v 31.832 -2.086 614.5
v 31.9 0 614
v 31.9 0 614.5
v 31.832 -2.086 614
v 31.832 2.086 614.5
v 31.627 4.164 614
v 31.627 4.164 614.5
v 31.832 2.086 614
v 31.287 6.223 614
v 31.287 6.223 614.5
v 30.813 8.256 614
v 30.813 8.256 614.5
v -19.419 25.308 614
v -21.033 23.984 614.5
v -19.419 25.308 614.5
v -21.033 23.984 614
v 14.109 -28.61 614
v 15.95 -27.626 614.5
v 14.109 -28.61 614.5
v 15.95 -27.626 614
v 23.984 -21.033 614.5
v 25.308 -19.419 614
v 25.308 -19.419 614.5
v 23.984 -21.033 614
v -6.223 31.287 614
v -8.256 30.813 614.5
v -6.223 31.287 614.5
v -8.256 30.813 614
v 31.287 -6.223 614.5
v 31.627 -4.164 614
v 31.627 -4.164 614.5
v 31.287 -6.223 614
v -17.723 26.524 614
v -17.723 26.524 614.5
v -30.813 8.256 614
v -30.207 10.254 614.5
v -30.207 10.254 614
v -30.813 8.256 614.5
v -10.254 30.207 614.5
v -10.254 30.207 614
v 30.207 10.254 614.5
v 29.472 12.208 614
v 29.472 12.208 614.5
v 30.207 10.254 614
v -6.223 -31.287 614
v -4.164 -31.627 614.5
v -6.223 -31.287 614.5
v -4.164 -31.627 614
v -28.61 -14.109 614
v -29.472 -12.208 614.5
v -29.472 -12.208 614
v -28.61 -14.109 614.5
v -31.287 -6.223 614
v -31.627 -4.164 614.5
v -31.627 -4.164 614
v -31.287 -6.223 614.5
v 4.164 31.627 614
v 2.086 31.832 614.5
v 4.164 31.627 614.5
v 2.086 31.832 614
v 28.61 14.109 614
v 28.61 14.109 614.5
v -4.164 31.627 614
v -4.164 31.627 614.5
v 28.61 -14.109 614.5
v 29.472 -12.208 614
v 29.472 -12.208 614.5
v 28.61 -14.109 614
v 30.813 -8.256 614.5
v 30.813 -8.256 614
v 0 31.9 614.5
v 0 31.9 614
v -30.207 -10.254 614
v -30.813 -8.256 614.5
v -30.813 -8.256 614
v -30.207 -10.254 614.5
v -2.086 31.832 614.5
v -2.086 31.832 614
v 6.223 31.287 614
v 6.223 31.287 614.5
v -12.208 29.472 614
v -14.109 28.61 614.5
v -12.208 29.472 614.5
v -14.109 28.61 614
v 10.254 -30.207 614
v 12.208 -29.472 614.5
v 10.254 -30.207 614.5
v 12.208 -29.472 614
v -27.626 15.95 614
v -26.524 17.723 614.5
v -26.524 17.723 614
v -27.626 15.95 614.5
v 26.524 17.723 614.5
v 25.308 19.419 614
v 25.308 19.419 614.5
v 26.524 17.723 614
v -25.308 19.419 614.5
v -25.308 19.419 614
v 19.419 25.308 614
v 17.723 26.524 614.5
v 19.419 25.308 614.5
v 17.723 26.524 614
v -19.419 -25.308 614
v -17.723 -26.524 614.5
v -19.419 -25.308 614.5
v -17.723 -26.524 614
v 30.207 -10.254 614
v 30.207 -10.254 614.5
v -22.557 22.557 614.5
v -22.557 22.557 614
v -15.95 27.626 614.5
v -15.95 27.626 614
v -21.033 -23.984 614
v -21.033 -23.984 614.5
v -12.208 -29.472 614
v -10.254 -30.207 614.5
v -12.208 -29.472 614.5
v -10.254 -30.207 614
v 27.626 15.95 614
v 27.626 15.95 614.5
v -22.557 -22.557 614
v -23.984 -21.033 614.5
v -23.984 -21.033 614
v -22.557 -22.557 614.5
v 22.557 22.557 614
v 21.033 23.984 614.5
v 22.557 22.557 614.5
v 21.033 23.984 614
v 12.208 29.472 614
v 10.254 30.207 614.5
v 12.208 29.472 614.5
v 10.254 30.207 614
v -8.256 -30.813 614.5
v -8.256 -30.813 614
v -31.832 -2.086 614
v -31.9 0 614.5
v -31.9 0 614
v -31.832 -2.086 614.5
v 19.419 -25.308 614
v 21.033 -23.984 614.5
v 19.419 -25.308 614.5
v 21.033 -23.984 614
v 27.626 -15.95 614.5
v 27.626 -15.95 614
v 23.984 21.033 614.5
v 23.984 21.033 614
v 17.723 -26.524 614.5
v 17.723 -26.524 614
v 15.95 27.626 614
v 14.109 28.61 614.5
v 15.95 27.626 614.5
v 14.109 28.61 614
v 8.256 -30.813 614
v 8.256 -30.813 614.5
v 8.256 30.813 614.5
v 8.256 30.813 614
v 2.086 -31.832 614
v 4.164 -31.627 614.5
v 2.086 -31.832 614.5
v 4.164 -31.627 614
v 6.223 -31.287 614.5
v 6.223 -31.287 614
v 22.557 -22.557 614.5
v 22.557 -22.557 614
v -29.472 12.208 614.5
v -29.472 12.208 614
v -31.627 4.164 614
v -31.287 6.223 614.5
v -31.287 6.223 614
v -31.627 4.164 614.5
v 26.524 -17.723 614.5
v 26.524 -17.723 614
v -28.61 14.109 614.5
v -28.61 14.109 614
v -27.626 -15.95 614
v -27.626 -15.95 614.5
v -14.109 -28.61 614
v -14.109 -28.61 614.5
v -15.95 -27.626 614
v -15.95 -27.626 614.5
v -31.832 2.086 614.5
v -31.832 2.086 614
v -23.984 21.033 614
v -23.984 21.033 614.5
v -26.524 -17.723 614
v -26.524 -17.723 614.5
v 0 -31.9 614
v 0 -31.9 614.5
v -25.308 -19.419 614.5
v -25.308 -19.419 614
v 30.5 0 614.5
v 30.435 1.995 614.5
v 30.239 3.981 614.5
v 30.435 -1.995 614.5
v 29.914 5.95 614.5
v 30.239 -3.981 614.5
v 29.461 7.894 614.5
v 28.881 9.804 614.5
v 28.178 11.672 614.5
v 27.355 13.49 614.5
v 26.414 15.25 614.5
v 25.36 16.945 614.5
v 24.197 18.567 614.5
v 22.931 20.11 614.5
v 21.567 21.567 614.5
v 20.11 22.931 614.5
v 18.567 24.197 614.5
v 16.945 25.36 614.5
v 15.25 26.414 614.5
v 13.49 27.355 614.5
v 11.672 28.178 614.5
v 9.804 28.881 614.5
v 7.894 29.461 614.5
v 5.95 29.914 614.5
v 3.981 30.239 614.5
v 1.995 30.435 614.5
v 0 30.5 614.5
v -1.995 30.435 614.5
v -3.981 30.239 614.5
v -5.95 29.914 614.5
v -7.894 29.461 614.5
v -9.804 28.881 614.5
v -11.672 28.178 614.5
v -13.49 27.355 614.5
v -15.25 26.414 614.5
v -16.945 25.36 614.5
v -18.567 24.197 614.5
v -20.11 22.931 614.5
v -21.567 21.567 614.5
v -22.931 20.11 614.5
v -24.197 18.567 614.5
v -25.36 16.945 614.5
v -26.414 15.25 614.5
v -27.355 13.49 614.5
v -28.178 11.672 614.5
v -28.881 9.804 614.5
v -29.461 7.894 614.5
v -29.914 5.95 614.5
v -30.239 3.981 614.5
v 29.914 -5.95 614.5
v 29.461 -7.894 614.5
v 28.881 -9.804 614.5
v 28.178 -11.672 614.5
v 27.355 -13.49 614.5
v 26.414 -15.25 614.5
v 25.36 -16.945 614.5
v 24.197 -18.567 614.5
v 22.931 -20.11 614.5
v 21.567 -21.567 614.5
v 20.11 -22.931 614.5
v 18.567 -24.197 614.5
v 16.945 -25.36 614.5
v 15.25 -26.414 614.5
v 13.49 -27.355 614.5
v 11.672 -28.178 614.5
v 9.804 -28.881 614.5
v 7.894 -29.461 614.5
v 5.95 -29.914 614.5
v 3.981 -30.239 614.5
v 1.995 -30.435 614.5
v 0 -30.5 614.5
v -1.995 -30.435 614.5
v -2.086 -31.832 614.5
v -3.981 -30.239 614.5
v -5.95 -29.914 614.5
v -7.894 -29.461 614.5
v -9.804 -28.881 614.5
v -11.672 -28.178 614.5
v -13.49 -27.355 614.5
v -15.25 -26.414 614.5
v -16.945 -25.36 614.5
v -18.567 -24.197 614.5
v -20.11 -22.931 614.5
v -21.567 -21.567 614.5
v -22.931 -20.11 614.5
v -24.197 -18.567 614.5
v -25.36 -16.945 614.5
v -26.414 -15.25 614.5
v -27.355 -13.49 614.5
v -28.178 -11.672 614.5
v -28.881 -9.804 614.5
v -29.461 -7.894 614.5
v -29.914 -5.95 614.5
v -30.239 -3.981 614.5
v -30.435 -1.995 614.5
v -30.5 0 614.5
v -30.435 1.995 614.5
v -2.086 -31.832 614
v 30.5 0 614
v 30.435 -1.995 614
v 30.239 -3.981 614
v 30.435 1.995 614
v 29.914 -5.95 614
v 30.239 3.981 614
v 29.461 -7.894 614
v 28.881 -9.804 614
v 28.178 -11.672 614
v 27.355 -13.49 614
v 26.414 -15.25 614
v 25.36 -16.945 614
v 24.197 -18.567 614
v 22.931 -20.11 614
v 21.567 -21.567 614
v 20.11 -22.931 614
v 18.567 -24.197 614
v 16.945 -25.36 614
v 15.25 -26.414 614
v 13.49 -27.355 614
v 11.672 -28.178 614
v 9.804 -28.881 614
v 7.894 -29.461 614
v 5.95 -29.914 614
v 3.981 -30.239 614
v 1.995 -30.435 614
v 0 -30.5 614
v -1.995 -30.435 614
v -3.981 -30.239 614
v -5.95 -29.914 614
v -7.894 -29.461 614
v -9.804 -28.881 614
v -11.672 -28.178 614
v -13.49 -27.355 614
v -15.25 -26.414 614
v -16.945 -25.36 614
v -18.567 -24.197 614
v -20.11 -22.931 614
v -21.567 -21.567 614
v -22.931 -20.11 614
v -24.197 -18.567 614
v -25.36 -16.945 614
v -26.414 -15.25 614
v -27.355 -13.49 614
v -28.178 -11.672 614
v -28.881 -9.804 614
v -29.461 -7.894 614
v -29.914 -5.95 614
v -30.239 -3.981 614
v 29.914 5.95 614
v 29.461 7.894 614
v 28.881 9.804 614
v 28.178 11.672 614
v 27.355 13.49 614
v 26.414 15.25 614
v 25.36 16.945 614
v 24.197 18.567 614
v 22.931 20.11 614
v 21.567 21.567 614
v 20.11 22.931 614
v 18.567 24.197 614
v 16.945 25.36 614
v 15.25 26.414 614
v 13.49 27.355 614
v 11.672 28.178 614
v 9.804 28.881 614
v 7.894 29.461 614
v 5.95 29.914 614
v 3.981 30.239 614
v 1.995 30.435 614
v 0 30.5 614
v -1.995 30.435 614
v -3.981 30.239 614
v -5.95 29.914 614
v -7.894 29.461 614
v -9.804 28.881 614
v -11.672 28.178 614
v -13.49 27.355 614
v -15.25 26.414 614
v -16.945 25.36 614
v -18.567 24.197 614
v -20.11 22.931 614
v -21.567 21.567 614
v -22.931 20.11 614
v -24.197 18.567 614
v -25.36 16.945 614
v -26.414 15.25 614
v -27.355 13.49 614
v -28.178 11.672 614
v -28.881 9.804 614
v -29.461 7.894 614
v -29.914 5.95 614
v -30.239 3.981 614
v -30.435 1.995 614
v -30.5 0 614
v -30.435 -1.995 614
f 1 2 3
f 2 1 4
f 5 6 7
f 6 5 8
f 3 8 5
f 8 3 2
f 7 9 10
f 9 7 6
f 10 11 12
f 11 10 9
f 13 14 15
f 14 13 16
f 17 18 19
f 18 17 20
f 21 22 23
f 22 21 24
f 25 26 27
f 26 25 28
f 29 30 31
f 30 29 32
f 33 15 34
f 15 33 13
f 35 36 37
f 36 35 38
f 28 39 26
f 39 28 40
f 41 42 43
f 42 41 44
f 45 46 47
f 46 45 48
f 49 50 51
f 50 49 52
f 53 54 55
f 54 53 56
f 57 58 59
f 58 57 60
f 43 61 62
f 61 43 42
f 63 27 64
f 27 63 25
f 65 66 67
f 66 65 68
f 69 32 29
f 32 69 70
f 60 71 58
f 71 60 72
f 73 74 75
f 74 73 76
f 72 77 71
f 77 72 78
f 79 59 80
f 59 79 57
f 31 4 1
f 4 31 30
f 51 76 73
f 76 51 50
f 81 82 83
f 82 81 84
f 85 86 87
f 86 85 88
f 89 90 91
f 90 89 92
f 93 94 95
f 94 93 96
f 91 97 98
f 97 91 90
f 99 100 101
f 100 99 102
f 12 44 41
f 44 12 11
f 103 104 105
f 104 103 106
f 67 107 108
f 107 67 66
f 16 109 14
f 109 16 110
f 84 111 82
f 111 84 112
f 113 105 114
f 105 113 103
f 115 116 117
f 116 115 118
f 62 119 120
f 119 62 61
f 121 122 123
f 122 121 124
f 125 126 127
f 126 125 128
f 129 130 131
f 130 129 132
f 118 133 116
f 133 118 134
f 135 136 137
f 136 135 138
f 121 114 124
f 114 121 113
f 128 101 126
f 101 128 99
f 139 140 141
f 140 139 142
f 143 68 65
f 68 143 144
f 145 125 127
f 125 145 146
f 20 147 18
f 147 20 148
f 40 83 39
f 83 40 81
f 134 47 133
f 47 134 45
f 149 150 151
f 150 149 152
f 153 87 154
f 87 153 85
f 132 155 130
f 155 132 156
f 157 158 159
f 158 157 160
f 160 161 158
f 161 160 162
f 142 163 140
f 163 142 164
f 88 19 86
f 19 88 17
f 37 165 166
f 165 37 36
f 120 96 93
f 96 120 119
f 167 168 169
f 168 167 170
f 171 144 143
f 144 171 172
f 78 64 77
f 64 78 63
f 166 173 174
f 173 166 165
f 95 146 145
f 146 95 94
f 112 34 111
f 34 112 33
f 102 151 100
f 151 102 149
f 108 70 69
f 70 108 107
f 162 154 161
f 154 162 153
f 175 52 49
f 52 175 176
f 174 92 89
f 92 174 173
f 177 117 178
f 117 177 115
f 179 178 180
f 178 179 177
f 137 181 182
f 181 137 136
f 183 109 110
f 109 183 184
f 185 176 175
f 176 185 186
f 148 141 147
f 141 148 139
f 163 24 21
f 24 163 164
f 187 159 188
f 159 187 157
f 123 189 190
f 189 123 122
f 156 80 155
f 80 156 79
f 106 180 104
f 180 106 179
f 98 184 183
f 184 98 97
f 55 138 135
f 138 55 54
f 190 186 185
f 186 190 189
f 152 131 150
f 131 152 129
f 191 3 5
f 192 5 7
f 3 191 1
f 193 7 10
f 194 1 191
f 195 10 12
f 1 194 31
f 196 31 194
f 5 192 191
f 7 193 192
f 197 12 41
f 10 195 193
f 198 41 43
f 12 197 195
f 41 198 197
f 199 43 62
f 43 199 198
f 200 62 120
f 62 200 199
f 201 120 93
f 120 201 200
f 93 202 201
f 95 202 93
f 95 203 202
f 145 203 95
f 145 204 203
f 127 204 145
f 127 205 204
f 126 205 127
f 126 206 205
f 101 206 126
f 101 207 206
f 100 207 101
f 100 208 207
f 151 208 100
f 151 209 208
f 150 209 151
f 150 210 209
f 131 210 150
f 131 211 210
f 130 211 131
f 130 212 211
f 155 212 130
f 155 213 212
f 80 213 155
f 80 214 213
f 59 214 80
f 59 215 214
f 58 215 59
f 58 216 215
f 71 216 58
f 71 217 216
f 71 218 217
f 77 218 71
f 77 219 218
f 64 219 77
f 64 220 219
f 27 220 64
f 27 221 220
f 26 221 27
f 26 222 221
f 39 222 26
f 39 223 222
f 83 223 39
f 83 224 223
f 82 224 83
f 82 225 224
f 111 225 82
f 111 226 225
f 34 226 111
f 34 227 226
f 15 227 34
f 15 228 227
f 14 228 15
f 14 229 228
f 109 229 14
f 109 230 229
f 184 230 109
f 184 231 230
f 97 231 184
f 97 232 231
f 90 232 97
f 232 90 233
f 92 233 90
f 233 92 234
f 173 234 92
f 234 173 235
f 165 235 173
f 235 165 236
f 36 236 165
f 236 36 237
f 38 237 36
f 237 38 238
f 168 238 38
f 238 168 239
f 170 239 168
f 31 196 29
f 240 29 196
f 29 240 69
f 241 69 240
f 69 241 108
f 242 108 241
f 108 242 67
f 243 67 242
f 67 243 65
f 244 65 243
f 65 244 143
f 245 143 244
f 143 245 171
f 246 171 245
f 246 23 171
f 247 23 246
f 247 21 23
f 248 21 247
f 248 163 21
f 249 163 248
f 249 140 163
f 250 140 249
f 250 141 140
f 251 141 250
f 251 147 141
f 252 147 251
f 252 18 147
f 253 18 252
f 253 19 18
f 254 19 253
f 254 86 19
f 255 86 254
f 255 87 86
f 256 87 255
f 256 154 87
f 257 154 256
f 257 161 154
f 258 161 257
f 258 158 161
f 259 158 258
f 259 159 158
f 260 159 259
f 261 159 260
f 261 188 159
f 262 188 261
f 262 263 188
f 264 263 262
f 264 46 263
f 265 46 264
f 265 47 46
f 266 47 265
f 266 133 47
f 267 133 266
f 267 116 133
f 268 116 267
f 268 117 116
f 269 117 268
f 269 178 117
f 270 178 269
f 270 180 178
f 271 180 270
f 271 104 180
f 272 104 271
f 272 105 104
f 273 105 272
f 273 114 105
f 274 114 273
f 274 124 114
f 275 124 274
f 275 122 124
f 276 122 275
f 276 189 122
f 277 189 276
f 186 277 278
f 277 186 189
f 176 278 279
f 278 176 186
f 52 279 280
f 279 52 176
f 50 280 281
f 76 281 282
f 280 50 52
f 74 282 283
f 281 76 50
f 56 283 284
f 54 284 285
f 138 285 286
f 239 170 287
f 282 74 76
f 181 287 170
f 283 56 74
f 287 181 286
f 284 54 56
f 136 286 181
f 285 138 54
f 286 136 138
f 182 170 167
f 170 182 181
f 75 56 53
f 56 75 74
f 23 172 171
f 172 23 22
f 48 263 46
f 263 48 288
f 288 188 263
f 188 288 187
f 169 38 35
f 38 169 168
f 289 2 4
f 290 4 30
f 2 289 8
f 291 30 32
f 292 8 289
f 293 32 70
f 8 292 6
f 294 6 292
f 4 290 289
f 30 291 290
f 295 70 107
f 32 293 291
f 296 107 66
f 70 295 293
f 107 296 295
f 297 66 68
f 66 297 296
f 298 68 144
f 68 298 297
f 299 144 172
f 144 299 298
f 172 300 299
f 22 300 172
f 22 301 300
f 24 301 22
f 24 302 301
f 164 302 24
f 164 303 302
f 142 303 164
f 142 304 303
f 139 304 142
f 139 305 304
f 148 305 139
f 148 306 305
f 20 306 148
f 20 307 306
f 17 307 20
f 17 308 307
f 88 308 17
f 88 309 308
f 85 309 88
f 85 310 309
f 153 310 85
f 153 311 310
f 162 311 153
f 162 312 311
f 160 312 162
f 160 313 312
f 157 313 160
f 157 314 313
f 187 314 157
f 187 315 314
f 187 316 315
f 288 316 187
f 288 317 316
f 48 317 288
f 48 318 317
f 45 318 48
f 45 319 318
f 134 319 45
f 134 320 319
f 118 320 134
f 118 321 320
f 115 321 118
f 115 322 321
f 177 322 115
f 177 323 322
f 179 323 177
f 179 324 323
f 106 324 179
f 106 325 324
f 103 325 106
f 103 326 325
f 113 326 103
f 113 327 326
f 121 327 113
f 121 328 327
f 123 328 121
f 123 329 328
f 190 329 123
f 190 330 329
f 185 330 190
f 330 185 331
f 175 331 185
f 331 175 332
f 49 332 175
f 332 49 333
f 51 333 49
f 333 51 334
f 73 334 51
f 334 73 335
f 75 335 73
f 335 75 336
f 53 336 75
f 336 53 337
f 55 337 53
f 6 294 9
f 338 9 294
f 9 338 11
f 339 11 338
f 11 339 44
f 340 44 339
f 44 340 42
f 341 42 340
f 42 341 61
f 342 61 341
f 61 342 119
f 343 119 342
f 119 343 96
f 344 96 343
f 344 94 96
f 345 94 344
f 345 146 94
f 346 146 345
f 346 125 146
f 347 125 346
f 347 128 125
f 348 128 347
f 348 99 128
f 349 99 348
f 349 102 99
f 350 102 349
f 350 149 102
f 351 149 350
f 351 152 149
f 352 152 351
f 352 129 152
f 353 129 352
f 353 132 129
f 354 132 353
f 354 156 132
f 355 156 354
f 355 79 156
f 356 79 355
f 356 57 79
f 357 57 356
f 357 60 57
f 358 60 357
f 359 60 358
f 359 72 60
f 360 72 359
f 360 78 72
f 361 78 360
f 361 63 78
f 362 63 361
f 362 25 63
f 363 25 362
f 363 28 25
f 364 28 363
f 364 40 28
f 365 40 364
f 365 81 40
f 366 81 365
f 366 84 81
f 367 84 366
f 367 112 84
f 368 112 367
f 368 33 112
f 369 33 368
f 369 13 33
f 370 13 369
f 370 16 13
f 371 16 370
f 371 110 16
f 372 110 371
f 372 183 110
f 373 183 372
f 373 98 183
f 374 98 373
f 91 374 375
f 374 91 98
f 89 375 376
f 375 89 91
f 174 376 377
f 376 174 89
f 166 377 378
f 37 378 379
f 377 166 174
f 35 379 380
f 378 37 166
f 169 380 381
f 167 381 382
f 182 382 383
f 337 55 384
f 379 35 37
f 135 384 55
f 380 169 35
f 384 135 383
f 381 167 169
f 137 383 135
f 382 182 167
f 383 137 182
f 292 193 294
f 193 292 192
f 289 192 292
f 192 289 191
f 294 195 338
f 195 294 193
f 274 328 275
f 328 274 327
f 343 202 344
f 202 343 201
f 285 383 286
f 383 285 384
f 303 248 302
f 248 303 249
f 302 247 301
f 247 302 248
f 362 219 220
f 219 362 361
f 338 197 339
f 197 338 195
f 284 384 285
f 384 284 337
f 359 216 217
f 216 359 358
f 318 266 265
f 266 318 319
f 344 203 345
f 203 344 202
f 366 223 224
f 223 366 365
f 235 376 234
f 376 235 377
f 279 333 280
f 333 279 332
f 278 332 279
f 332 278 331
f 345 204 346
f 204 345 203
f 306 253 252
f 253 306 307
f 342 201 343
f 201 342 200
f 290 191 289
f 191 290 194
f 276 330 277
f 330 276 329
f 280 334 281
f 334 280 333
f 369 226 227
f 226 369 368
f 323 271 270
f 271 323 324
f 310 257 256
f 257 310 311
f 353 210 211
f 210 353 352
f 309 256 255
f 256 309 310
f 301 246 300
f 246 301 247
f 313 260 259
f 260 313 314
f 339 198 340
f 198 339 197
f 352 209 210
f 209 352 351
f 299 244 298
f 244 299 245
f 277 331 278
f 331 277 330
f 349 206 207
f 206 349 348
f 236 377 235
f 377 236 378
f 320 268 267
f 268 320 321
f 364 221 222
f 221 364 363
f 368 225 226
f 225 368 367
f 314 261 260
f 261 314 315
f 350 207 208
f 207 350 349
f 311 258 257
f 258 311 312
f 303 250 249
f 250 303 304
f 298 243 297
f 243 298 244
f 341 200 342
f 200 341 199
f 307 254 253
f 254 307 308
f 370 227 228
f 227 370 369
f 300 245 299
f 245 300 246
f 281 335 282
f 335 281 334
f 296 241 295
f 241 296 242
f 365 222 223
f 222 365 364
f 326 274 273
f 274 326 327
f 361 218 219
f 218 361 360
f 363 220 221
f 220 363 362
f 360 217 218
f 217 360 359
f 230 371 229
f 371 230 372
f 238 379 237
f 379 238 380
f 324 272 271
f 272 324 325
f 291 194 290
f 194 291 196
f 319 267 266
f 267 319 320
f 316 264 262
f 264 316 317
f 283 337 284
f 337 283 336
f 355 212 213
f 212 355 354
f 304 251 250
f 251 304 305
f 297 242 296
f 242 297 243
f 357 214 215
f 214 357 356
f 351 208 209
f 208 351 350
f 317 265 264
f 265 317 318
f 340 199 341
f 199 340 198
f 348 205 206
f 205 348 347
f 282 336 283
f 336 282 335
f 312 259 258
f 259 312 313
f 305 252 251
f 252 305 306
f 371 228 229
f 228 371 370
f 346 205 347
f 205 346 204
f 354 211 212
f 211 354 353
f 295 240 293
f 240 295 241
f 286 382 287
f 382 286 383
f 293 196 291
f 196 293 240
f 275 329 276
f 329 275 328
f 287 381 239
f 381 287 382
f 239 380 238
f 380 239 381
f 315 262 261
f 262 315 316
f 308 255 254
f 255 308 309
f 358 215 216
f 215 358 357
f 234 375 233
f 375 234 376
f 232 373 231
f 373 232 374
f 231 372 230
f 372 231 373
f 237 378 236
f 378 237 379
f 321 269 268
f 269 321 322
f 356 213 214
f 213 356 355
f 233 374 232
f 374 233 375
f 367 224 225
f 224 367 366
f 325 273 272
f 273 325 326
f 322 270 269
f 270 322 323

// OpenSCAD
// file: ../lib/astra66_core.scad
// =============================================================================
// ASTRA-66 CAD rev B -- core library
// Parameters (generated from analysis.py by build.py), derived stations and helpers.
// Every part file includes this; stations mirror analysis.py X[] exactly.
//
// Frame: rocket axis = +Z, STA 0 = nose tip, stations increase aft.
// Angles: measured about +Z from +X toward +Y.  90 deg = switch / hatch side,
// 270 deg = camera side, 45 deg = rail-button line, fins at 0/90/180/270 deg.
// =============================================================================
include <../astra66_params.scad>

$fn = FN;
EPS = 0.01;
CAD_REV = "B";

// ----------------------------------------------------------------- radii
R_OD    = BODY_OD / 2;                 // body tube outer
R_ID    = BODY_ID / 2;                 // body tube inner
R_SH    = (BODY_ID - FIT_SH) / 2;      // printed shoulder / ring OD radius
R_SI    = R_SH - NC_SH_WALL;           // nose shoulder inner radius
R_CO    = CPL_OD / 2;                  // coupler outer
R_CI    = CPL_ID / 2;                  // coupler inner
R_BH_IN = (CPL_ID - 0.2) / 2;          // inner bulkhead disc (fits in coupler)
R_MO    = MMT_OD / 2;
R_MI    = MMT_ID / 2;
R_RING_BORE = (MMT_OD + FIT_SH) / 2;   // centering-ring / core bore
R_TAB_FLOOR = max(R_MO, RET_CLEAR_D / 2);          // rev B: tab clears the COTS retainer
FIN_TAB_H   = R_OD - R_TAB_FLOOR - FIN_TAB_CLR;

// ----------------------------------------------------------------- stations
X_NC_BASE     = NC_L;
X_SH_END      = NC_L + NC_SH_L;
X_PL_END      = NC_L + PL_L;
X_BAND_END    = X_PL_END + AV_BAND_L;
X_END         = X_BAND_END + BO_L;
L_OVERALL     = X_END;                              // airframe length (excl. COTS retainer)
X_CPL_FWD     = X_PL_END - AV_INS;
X_CPL_AFT     = X_BAND_END + AV_INS;
X_AVB_FWD_OUT = X_CPL_FWD - AV_BH_T;                // AV-303 forward face
X_AVB_AFT_OUT = X_CPL_AFT + GASKET_T;               // AV-304 outer-disc forward face
X_AVB_AFT_END = X_AVB_AFT_OUT + AV_BH_T;            // AV-304 aft face (recovery bay starts)
X_SLED_FWD    = X_CPL_FWD + AV_BH_T + SLED_FWD_GAP;
X_SLED_AFT    = X_SLED_FWD + SLED_L;
X_MMT_AFT     = X_END + MMT_AFT_EXT;
X_MMT_FWD     = X_MMT_AFT - MMT_L;
X_FIN_LE      = X_END - FIN_CR;
X_TAB_FWD     = X_FIN_LE + FIN_TAB_FWD;
X_TAB_AFT     = X_END - LOCK_T;
X_CORE_FWD    = X_TAB_FWD - CORE_RING_T;
X_CORE_AFT    = X_END - LOCK_T;
X_NC_SCREW    = NC_L + NC_SH_L / 2;
X_CAM         = X_SH_END + CAM_OFF;
X_HATCH       = X_SH_END + HATCH_OFF;
X_RB_FWD      = X_MMT_FWD - RB_FWD_OFF;
X_RB_AFT      = X_END - RB_AFT_OFF;
X_TRAY_FWD    = X_AVB_FWD_OUT - TRAY_L;
X_SW          = X_PL_END + AV_BAND_L / 2;
X_MOTOR_FWD   = X_MMT_AFT - MOTOR_L;
X_BAT0        = X_SLED_FWD + 2;
BAT_CAGE_L    = 12 + BAT_L + 0.6;
PAYLOAD_BAY_L  = X_AVB_FWD_OUT - X_SH_END;
RECOVERY_BAY_L = X_MMT_FWD - X_AVB_AFT_END;

FIN_ANGLES      = [for (i = [0 : FIN_N - 1]) i * 360 / FIN_N];
LOCK_SCREW_ANG  = [45, 135, 225, 315];
STATIC_PORT_ANG = [45, 135, 225, 315];

// ----------------------------------------------------------------- geometry helpers
function ogive_rho()  = (R_OD * R_OD + NC_L * NC_L) / (2 * R_OD);
function ogive_r(x)   = sqrt(max(pow(ogive_rho(), 2) - pow(NC_L - x, 2), 0)) + R_OD - ogive_rho();

// Solid of revolution of the tangent ogive between stations x0..x1, radially offset inward by off.
module ogive_solid(x0, x1, off = 0, n = 72) {
    s = (x0 == 0) ? 1 : 0;
    rotate_extrude()
        polygon(concat([[0, x0]],
                       [for (i = [s : n]) let(x = x0 + (x1 - x0) * i / n) [max(ogive_r(x) - off, 0.01), x]],
                       [[0, x1]]));
}

module tube_r(ro, ri, z0, z1) {
    translate([0, 0, z0]) difference() {
        cylinder(r = ro, h = z1 - z0);
        translate([0, 0, -1]) cylinder(r = ri, h = z1 - z0 + 2);
    }
}

module at_angle(a) { rotate([0, 0, a]) children(); }

// Cylinder of diameter d along the radial direction at angle a, from radius r0 to r1, at station z.
module radial_cyl(d, z, a, r0, r1) {
    at_angle(a) translate([r0, 0, z]) rotate([0, 90, 0]) cylinder(d = d, h = r1 - r0);
}

module rounded_rect(l, w, r) { offset(r = r) square([l - 2 * r, w - 2 * r], center = true); }

// Radial prism with a rounded-rectangle footprint (l axial x w tangential) centred at station z.
module radial_prism(a, z, l, w, rr, r0, r1) {
    at_angle(a) translate([r0, 0, z]) rotate([0, 90, 0]) linear_extrude(r1 - r0) rounded_rect(l, w, rr);
}

// Block in the radial frame at angle a: radial r0..r1, tangential +/-hw, stations z0..z1, clipped to radius rc.
module radial_block(a, r0, r1, hw, z0, z1, rc) {
    intersection() {
        at_angle(a) translate([r0, -hw, z0]) cube([r1 - r0, 2 * hw, z1 - z0]);
        translate([0, 0, z0 - 1]) cylinder(r = rc, h = z1 - z0 + 2);
    }
}

// Camera frame: child +Z = lens axis (outward, tilted CAM_TILT aft), origin at the lens face centre.
// Lens-face radius CAM_R0 is the smaller of (a) the tilted barrel rim 0.5 mm inside the bore and
// (b) the tilted camera-body corners 0.5 mm inside the bore -- so any CAM_W/CAM_LEN entered fits.
CAM_SETBACK = CAM_LENS_L * cos(CAM_TILT) + (CAM_LENS_HOLE - 1) / 2 * sin(CAM_TILT) + 0.5;
CAM_R0 = min(R_ID - CAM_SETBACK, sqrt(pow(R_ID - 0.5, 2) - pow(CAM_W / 2, 2)) - CAM_LEN / 2 * sin(CAM_TILT));
module cam_frame() {
    at_angle(CAM_ANG) translate([CAM_R0, 0, X_CAM]) rotate([0, 90 - CAM_TILT, 0]) children();
}

echo(str("ASTRA-66 CAD rev ", CAD_REV, ": L_OVERALL=", L_OVERALL, " payload bay=", PAYLOAD_BAY_L,
         " recovery bay=", RECOVERY_BAY_L, " fin tab depth=", FIN_TAB_H));
// main file
// ASTRA-66 CAD rev B -- AV-309 Aft bulkhead face gasket
// Annulus matching the coupler aft end face (CPL_OD / CPL_ID), 1.5 mm EVA foam, modelled compressed at GASKET_T.
// Die/knife cut: OUT="2d".
include <../lib/astra66_core.scad>

OUT = "3d";

module AV_309_gasket() { tube_r(R_CO, R_CI, X_CPL_AFT, X_CPL_AFT + GASKET_T); }

if (OUT == "2d") projection() AV_309_gasket(); else AV_309_gasket();
